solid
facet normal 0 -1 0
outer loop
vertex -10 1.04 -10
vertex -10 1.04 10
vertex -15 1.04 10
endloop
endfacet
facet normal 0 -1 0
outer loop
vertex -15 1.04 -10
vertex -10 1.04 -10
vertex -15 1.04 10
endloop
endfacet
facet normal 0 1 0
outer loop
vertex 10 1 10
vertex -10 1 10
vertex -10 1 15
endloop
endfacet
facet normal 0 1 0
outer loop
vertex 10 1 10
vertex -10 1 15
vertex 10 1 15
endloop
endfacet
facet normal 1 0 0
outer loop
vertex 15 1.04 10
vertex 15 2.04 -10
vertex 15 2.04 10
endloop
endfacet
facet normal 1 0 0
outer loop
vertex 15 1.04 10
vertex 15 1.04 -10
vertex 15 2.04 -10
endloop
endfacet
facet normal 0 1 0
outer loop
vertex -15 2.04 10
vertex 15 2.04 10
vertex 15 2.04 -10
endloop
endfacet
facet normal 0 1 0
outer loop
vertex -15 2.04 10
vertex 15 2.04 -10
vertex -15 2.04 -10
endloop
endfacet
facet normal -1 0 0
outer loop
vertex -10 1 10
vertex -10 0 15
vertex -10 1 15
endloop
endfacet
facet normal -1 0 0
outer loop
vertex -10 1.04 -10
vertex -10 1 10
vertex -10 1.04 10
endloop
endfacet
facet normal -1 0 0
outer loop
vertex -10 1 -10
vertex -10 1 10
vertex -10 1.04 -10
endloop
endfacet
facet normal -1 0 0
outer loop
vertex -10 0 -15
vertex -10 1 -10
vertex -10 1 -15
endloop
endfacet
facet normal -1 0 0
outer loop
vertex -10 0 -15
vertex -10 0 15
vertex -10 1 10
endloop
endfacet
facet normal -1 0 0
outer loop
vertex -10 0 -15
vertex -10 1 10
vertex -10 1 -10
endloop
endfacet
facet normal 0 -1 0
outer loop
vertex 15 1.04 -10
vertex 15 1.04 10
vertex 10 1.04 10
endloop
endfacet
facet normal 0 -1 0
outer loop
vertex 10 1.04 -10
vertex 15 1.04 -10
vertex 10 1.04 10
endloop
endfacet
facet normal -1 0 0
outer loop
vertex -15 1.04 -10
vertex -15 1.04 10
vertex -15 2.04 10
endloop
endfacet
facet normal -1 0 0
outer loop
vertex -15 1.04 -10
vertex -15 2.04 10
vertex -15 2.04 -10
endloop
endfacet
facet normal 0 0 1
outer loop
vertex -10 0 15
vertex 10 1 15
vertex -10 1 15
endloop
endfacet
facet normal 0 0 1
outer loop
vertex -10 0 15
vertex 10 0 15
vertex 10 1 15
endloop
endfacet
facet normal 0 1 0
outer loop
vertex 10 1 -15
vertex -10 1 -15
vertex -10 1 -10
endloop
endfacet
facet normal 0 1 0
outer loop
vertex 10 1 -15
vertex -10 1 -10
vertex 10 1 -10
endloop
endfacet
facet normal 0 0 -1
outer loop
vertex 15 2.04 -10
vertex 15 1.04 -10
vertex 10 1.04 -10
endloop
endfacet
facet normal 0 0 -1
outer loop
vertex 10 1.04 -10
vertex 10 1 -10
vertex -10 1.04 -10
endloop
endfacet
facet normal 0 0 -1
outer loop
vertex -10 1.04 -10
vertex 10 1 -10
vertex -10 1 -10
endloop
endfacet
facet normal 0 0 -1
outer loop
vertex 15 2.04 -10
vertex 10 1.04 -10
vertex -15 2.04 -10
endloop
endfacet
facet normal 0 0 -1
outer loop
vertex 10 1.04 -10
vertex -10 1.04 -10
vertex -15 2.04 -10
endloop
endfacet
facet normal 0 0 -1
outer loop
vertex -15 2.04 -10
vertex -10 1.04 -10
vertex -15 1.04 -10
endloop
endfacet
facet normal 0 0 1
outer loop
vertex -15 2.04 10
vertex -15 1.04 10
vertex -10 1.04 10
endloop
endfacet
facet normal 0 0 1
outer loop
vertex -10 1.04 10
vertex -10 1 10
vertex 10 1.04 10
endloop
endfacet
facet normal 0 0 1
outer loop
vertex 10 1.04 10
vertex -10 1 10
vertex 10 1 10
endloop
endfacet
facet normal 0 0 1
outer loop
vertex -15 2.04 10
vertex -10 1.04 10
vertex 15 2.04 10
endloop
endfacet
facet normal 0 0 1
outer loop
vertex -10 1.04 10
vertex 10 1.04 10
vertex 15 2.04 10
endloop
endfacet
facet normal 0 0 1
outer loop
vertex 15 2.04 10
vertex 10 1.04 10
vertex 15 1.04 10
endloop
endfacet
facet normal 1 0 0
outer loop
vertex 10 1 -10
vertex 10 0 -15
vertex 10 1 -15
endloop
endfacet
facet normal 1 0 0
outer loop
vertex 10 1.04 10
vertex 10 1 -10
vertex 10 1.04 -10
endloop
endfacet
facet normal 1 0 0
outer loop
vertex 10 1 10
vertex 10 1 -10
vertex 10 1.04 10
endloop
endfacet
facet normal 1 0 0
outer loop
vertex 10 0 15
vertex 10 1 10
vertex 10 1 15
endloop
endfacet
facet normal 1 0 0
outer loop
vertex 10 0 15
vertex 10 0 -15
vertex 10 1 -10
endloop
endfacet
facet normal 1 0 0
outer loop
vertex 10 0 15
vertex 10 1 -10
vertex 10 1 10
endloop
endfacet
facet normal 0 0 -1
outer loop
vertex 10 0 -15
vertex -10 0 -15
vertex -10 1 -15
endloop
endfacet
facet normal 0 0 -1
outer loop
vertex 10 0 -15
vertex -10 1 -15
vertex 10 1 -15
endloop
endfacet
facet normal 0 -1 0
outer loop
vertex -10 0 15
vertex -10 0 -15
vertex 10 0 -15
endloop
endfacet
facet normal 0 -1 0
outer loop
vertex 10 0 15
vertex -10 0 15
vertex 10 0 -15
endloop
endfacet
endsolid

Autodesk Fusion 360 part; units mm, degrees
sketch "Sketch1" plane through (0, 0, 0) normal (0, 1, 0) x (1, 0, 0)
  line L0 (10, -15) -> (-10, -15)
  line L1 (-10, -15) -> (-10, 15)
  line L2 (-10, 15) -> (10, 15)
  line L3 (10, 15) -> (10, -15)
  line L4 (10, -15) -> (-10, 15) construction
  line L5 (-10, -15) -> (10, 15) construction
  dimension "d1" = 20
  dimension "d2" = 30
extrude "Extrude1" add sketch "Sketch1" along normal blind 1
sketch "Sketch2" plane through (0, 1, 0) normal (0, 1, 0) x (-1, 0, 0)
  line L0 (-10, -15) -> (10, -15)
  line L1 (10, -15) -> (10, 15)
  line L2 (10, 15) -> (-10, 15)
  line L3 (-10, 15) -> (-10, -15)
  line L4 (-10, 10) -> (10, 10)
  line L5 (10, 10) -> (10, -10)
  line L6 (10, -10) -> (-10, -10)
  line L7 (-10, -10) -> (-10, 10)
  line L8 (-10, 10) -> (10, -10) construction
  line L9 (10, 10) -> (-10, -10) construction
  dimension "d5" = 20
extrude "Extrude2" add sketch "Sketch2" along normal blind 0.04 contours L1 L3 L4 L5 L6 L7
sketch "Sketch3" plane through (0, 1.04, 0) normal (0, 1, 0) x (-1, 0, 0)
  line L0 (-10, -10) -> (10, -10)
  line L1 (10, -10) -> (10, 10)
  line L2 (10, 10) -> (-10, 10)
  line L3 (-10, 10) -> (-10, -10)
  line L4 (-15, 10) -> (15, 10)
  line L5 (15, 10) -> (15, -10)
  line L6 (15, -10) -> (-15, -10)
  line L7 (-15, -10) -> (-15, 10)
  line L8 (-15, 10) -> (15, -10) construction
  line L9 (15, 10) -> (-15, -10) construction
  dimension "d8" = 30
  dimension "d9" = 20
extrude "Extrude3" add sketch "Sketch3" along normal blind 1
